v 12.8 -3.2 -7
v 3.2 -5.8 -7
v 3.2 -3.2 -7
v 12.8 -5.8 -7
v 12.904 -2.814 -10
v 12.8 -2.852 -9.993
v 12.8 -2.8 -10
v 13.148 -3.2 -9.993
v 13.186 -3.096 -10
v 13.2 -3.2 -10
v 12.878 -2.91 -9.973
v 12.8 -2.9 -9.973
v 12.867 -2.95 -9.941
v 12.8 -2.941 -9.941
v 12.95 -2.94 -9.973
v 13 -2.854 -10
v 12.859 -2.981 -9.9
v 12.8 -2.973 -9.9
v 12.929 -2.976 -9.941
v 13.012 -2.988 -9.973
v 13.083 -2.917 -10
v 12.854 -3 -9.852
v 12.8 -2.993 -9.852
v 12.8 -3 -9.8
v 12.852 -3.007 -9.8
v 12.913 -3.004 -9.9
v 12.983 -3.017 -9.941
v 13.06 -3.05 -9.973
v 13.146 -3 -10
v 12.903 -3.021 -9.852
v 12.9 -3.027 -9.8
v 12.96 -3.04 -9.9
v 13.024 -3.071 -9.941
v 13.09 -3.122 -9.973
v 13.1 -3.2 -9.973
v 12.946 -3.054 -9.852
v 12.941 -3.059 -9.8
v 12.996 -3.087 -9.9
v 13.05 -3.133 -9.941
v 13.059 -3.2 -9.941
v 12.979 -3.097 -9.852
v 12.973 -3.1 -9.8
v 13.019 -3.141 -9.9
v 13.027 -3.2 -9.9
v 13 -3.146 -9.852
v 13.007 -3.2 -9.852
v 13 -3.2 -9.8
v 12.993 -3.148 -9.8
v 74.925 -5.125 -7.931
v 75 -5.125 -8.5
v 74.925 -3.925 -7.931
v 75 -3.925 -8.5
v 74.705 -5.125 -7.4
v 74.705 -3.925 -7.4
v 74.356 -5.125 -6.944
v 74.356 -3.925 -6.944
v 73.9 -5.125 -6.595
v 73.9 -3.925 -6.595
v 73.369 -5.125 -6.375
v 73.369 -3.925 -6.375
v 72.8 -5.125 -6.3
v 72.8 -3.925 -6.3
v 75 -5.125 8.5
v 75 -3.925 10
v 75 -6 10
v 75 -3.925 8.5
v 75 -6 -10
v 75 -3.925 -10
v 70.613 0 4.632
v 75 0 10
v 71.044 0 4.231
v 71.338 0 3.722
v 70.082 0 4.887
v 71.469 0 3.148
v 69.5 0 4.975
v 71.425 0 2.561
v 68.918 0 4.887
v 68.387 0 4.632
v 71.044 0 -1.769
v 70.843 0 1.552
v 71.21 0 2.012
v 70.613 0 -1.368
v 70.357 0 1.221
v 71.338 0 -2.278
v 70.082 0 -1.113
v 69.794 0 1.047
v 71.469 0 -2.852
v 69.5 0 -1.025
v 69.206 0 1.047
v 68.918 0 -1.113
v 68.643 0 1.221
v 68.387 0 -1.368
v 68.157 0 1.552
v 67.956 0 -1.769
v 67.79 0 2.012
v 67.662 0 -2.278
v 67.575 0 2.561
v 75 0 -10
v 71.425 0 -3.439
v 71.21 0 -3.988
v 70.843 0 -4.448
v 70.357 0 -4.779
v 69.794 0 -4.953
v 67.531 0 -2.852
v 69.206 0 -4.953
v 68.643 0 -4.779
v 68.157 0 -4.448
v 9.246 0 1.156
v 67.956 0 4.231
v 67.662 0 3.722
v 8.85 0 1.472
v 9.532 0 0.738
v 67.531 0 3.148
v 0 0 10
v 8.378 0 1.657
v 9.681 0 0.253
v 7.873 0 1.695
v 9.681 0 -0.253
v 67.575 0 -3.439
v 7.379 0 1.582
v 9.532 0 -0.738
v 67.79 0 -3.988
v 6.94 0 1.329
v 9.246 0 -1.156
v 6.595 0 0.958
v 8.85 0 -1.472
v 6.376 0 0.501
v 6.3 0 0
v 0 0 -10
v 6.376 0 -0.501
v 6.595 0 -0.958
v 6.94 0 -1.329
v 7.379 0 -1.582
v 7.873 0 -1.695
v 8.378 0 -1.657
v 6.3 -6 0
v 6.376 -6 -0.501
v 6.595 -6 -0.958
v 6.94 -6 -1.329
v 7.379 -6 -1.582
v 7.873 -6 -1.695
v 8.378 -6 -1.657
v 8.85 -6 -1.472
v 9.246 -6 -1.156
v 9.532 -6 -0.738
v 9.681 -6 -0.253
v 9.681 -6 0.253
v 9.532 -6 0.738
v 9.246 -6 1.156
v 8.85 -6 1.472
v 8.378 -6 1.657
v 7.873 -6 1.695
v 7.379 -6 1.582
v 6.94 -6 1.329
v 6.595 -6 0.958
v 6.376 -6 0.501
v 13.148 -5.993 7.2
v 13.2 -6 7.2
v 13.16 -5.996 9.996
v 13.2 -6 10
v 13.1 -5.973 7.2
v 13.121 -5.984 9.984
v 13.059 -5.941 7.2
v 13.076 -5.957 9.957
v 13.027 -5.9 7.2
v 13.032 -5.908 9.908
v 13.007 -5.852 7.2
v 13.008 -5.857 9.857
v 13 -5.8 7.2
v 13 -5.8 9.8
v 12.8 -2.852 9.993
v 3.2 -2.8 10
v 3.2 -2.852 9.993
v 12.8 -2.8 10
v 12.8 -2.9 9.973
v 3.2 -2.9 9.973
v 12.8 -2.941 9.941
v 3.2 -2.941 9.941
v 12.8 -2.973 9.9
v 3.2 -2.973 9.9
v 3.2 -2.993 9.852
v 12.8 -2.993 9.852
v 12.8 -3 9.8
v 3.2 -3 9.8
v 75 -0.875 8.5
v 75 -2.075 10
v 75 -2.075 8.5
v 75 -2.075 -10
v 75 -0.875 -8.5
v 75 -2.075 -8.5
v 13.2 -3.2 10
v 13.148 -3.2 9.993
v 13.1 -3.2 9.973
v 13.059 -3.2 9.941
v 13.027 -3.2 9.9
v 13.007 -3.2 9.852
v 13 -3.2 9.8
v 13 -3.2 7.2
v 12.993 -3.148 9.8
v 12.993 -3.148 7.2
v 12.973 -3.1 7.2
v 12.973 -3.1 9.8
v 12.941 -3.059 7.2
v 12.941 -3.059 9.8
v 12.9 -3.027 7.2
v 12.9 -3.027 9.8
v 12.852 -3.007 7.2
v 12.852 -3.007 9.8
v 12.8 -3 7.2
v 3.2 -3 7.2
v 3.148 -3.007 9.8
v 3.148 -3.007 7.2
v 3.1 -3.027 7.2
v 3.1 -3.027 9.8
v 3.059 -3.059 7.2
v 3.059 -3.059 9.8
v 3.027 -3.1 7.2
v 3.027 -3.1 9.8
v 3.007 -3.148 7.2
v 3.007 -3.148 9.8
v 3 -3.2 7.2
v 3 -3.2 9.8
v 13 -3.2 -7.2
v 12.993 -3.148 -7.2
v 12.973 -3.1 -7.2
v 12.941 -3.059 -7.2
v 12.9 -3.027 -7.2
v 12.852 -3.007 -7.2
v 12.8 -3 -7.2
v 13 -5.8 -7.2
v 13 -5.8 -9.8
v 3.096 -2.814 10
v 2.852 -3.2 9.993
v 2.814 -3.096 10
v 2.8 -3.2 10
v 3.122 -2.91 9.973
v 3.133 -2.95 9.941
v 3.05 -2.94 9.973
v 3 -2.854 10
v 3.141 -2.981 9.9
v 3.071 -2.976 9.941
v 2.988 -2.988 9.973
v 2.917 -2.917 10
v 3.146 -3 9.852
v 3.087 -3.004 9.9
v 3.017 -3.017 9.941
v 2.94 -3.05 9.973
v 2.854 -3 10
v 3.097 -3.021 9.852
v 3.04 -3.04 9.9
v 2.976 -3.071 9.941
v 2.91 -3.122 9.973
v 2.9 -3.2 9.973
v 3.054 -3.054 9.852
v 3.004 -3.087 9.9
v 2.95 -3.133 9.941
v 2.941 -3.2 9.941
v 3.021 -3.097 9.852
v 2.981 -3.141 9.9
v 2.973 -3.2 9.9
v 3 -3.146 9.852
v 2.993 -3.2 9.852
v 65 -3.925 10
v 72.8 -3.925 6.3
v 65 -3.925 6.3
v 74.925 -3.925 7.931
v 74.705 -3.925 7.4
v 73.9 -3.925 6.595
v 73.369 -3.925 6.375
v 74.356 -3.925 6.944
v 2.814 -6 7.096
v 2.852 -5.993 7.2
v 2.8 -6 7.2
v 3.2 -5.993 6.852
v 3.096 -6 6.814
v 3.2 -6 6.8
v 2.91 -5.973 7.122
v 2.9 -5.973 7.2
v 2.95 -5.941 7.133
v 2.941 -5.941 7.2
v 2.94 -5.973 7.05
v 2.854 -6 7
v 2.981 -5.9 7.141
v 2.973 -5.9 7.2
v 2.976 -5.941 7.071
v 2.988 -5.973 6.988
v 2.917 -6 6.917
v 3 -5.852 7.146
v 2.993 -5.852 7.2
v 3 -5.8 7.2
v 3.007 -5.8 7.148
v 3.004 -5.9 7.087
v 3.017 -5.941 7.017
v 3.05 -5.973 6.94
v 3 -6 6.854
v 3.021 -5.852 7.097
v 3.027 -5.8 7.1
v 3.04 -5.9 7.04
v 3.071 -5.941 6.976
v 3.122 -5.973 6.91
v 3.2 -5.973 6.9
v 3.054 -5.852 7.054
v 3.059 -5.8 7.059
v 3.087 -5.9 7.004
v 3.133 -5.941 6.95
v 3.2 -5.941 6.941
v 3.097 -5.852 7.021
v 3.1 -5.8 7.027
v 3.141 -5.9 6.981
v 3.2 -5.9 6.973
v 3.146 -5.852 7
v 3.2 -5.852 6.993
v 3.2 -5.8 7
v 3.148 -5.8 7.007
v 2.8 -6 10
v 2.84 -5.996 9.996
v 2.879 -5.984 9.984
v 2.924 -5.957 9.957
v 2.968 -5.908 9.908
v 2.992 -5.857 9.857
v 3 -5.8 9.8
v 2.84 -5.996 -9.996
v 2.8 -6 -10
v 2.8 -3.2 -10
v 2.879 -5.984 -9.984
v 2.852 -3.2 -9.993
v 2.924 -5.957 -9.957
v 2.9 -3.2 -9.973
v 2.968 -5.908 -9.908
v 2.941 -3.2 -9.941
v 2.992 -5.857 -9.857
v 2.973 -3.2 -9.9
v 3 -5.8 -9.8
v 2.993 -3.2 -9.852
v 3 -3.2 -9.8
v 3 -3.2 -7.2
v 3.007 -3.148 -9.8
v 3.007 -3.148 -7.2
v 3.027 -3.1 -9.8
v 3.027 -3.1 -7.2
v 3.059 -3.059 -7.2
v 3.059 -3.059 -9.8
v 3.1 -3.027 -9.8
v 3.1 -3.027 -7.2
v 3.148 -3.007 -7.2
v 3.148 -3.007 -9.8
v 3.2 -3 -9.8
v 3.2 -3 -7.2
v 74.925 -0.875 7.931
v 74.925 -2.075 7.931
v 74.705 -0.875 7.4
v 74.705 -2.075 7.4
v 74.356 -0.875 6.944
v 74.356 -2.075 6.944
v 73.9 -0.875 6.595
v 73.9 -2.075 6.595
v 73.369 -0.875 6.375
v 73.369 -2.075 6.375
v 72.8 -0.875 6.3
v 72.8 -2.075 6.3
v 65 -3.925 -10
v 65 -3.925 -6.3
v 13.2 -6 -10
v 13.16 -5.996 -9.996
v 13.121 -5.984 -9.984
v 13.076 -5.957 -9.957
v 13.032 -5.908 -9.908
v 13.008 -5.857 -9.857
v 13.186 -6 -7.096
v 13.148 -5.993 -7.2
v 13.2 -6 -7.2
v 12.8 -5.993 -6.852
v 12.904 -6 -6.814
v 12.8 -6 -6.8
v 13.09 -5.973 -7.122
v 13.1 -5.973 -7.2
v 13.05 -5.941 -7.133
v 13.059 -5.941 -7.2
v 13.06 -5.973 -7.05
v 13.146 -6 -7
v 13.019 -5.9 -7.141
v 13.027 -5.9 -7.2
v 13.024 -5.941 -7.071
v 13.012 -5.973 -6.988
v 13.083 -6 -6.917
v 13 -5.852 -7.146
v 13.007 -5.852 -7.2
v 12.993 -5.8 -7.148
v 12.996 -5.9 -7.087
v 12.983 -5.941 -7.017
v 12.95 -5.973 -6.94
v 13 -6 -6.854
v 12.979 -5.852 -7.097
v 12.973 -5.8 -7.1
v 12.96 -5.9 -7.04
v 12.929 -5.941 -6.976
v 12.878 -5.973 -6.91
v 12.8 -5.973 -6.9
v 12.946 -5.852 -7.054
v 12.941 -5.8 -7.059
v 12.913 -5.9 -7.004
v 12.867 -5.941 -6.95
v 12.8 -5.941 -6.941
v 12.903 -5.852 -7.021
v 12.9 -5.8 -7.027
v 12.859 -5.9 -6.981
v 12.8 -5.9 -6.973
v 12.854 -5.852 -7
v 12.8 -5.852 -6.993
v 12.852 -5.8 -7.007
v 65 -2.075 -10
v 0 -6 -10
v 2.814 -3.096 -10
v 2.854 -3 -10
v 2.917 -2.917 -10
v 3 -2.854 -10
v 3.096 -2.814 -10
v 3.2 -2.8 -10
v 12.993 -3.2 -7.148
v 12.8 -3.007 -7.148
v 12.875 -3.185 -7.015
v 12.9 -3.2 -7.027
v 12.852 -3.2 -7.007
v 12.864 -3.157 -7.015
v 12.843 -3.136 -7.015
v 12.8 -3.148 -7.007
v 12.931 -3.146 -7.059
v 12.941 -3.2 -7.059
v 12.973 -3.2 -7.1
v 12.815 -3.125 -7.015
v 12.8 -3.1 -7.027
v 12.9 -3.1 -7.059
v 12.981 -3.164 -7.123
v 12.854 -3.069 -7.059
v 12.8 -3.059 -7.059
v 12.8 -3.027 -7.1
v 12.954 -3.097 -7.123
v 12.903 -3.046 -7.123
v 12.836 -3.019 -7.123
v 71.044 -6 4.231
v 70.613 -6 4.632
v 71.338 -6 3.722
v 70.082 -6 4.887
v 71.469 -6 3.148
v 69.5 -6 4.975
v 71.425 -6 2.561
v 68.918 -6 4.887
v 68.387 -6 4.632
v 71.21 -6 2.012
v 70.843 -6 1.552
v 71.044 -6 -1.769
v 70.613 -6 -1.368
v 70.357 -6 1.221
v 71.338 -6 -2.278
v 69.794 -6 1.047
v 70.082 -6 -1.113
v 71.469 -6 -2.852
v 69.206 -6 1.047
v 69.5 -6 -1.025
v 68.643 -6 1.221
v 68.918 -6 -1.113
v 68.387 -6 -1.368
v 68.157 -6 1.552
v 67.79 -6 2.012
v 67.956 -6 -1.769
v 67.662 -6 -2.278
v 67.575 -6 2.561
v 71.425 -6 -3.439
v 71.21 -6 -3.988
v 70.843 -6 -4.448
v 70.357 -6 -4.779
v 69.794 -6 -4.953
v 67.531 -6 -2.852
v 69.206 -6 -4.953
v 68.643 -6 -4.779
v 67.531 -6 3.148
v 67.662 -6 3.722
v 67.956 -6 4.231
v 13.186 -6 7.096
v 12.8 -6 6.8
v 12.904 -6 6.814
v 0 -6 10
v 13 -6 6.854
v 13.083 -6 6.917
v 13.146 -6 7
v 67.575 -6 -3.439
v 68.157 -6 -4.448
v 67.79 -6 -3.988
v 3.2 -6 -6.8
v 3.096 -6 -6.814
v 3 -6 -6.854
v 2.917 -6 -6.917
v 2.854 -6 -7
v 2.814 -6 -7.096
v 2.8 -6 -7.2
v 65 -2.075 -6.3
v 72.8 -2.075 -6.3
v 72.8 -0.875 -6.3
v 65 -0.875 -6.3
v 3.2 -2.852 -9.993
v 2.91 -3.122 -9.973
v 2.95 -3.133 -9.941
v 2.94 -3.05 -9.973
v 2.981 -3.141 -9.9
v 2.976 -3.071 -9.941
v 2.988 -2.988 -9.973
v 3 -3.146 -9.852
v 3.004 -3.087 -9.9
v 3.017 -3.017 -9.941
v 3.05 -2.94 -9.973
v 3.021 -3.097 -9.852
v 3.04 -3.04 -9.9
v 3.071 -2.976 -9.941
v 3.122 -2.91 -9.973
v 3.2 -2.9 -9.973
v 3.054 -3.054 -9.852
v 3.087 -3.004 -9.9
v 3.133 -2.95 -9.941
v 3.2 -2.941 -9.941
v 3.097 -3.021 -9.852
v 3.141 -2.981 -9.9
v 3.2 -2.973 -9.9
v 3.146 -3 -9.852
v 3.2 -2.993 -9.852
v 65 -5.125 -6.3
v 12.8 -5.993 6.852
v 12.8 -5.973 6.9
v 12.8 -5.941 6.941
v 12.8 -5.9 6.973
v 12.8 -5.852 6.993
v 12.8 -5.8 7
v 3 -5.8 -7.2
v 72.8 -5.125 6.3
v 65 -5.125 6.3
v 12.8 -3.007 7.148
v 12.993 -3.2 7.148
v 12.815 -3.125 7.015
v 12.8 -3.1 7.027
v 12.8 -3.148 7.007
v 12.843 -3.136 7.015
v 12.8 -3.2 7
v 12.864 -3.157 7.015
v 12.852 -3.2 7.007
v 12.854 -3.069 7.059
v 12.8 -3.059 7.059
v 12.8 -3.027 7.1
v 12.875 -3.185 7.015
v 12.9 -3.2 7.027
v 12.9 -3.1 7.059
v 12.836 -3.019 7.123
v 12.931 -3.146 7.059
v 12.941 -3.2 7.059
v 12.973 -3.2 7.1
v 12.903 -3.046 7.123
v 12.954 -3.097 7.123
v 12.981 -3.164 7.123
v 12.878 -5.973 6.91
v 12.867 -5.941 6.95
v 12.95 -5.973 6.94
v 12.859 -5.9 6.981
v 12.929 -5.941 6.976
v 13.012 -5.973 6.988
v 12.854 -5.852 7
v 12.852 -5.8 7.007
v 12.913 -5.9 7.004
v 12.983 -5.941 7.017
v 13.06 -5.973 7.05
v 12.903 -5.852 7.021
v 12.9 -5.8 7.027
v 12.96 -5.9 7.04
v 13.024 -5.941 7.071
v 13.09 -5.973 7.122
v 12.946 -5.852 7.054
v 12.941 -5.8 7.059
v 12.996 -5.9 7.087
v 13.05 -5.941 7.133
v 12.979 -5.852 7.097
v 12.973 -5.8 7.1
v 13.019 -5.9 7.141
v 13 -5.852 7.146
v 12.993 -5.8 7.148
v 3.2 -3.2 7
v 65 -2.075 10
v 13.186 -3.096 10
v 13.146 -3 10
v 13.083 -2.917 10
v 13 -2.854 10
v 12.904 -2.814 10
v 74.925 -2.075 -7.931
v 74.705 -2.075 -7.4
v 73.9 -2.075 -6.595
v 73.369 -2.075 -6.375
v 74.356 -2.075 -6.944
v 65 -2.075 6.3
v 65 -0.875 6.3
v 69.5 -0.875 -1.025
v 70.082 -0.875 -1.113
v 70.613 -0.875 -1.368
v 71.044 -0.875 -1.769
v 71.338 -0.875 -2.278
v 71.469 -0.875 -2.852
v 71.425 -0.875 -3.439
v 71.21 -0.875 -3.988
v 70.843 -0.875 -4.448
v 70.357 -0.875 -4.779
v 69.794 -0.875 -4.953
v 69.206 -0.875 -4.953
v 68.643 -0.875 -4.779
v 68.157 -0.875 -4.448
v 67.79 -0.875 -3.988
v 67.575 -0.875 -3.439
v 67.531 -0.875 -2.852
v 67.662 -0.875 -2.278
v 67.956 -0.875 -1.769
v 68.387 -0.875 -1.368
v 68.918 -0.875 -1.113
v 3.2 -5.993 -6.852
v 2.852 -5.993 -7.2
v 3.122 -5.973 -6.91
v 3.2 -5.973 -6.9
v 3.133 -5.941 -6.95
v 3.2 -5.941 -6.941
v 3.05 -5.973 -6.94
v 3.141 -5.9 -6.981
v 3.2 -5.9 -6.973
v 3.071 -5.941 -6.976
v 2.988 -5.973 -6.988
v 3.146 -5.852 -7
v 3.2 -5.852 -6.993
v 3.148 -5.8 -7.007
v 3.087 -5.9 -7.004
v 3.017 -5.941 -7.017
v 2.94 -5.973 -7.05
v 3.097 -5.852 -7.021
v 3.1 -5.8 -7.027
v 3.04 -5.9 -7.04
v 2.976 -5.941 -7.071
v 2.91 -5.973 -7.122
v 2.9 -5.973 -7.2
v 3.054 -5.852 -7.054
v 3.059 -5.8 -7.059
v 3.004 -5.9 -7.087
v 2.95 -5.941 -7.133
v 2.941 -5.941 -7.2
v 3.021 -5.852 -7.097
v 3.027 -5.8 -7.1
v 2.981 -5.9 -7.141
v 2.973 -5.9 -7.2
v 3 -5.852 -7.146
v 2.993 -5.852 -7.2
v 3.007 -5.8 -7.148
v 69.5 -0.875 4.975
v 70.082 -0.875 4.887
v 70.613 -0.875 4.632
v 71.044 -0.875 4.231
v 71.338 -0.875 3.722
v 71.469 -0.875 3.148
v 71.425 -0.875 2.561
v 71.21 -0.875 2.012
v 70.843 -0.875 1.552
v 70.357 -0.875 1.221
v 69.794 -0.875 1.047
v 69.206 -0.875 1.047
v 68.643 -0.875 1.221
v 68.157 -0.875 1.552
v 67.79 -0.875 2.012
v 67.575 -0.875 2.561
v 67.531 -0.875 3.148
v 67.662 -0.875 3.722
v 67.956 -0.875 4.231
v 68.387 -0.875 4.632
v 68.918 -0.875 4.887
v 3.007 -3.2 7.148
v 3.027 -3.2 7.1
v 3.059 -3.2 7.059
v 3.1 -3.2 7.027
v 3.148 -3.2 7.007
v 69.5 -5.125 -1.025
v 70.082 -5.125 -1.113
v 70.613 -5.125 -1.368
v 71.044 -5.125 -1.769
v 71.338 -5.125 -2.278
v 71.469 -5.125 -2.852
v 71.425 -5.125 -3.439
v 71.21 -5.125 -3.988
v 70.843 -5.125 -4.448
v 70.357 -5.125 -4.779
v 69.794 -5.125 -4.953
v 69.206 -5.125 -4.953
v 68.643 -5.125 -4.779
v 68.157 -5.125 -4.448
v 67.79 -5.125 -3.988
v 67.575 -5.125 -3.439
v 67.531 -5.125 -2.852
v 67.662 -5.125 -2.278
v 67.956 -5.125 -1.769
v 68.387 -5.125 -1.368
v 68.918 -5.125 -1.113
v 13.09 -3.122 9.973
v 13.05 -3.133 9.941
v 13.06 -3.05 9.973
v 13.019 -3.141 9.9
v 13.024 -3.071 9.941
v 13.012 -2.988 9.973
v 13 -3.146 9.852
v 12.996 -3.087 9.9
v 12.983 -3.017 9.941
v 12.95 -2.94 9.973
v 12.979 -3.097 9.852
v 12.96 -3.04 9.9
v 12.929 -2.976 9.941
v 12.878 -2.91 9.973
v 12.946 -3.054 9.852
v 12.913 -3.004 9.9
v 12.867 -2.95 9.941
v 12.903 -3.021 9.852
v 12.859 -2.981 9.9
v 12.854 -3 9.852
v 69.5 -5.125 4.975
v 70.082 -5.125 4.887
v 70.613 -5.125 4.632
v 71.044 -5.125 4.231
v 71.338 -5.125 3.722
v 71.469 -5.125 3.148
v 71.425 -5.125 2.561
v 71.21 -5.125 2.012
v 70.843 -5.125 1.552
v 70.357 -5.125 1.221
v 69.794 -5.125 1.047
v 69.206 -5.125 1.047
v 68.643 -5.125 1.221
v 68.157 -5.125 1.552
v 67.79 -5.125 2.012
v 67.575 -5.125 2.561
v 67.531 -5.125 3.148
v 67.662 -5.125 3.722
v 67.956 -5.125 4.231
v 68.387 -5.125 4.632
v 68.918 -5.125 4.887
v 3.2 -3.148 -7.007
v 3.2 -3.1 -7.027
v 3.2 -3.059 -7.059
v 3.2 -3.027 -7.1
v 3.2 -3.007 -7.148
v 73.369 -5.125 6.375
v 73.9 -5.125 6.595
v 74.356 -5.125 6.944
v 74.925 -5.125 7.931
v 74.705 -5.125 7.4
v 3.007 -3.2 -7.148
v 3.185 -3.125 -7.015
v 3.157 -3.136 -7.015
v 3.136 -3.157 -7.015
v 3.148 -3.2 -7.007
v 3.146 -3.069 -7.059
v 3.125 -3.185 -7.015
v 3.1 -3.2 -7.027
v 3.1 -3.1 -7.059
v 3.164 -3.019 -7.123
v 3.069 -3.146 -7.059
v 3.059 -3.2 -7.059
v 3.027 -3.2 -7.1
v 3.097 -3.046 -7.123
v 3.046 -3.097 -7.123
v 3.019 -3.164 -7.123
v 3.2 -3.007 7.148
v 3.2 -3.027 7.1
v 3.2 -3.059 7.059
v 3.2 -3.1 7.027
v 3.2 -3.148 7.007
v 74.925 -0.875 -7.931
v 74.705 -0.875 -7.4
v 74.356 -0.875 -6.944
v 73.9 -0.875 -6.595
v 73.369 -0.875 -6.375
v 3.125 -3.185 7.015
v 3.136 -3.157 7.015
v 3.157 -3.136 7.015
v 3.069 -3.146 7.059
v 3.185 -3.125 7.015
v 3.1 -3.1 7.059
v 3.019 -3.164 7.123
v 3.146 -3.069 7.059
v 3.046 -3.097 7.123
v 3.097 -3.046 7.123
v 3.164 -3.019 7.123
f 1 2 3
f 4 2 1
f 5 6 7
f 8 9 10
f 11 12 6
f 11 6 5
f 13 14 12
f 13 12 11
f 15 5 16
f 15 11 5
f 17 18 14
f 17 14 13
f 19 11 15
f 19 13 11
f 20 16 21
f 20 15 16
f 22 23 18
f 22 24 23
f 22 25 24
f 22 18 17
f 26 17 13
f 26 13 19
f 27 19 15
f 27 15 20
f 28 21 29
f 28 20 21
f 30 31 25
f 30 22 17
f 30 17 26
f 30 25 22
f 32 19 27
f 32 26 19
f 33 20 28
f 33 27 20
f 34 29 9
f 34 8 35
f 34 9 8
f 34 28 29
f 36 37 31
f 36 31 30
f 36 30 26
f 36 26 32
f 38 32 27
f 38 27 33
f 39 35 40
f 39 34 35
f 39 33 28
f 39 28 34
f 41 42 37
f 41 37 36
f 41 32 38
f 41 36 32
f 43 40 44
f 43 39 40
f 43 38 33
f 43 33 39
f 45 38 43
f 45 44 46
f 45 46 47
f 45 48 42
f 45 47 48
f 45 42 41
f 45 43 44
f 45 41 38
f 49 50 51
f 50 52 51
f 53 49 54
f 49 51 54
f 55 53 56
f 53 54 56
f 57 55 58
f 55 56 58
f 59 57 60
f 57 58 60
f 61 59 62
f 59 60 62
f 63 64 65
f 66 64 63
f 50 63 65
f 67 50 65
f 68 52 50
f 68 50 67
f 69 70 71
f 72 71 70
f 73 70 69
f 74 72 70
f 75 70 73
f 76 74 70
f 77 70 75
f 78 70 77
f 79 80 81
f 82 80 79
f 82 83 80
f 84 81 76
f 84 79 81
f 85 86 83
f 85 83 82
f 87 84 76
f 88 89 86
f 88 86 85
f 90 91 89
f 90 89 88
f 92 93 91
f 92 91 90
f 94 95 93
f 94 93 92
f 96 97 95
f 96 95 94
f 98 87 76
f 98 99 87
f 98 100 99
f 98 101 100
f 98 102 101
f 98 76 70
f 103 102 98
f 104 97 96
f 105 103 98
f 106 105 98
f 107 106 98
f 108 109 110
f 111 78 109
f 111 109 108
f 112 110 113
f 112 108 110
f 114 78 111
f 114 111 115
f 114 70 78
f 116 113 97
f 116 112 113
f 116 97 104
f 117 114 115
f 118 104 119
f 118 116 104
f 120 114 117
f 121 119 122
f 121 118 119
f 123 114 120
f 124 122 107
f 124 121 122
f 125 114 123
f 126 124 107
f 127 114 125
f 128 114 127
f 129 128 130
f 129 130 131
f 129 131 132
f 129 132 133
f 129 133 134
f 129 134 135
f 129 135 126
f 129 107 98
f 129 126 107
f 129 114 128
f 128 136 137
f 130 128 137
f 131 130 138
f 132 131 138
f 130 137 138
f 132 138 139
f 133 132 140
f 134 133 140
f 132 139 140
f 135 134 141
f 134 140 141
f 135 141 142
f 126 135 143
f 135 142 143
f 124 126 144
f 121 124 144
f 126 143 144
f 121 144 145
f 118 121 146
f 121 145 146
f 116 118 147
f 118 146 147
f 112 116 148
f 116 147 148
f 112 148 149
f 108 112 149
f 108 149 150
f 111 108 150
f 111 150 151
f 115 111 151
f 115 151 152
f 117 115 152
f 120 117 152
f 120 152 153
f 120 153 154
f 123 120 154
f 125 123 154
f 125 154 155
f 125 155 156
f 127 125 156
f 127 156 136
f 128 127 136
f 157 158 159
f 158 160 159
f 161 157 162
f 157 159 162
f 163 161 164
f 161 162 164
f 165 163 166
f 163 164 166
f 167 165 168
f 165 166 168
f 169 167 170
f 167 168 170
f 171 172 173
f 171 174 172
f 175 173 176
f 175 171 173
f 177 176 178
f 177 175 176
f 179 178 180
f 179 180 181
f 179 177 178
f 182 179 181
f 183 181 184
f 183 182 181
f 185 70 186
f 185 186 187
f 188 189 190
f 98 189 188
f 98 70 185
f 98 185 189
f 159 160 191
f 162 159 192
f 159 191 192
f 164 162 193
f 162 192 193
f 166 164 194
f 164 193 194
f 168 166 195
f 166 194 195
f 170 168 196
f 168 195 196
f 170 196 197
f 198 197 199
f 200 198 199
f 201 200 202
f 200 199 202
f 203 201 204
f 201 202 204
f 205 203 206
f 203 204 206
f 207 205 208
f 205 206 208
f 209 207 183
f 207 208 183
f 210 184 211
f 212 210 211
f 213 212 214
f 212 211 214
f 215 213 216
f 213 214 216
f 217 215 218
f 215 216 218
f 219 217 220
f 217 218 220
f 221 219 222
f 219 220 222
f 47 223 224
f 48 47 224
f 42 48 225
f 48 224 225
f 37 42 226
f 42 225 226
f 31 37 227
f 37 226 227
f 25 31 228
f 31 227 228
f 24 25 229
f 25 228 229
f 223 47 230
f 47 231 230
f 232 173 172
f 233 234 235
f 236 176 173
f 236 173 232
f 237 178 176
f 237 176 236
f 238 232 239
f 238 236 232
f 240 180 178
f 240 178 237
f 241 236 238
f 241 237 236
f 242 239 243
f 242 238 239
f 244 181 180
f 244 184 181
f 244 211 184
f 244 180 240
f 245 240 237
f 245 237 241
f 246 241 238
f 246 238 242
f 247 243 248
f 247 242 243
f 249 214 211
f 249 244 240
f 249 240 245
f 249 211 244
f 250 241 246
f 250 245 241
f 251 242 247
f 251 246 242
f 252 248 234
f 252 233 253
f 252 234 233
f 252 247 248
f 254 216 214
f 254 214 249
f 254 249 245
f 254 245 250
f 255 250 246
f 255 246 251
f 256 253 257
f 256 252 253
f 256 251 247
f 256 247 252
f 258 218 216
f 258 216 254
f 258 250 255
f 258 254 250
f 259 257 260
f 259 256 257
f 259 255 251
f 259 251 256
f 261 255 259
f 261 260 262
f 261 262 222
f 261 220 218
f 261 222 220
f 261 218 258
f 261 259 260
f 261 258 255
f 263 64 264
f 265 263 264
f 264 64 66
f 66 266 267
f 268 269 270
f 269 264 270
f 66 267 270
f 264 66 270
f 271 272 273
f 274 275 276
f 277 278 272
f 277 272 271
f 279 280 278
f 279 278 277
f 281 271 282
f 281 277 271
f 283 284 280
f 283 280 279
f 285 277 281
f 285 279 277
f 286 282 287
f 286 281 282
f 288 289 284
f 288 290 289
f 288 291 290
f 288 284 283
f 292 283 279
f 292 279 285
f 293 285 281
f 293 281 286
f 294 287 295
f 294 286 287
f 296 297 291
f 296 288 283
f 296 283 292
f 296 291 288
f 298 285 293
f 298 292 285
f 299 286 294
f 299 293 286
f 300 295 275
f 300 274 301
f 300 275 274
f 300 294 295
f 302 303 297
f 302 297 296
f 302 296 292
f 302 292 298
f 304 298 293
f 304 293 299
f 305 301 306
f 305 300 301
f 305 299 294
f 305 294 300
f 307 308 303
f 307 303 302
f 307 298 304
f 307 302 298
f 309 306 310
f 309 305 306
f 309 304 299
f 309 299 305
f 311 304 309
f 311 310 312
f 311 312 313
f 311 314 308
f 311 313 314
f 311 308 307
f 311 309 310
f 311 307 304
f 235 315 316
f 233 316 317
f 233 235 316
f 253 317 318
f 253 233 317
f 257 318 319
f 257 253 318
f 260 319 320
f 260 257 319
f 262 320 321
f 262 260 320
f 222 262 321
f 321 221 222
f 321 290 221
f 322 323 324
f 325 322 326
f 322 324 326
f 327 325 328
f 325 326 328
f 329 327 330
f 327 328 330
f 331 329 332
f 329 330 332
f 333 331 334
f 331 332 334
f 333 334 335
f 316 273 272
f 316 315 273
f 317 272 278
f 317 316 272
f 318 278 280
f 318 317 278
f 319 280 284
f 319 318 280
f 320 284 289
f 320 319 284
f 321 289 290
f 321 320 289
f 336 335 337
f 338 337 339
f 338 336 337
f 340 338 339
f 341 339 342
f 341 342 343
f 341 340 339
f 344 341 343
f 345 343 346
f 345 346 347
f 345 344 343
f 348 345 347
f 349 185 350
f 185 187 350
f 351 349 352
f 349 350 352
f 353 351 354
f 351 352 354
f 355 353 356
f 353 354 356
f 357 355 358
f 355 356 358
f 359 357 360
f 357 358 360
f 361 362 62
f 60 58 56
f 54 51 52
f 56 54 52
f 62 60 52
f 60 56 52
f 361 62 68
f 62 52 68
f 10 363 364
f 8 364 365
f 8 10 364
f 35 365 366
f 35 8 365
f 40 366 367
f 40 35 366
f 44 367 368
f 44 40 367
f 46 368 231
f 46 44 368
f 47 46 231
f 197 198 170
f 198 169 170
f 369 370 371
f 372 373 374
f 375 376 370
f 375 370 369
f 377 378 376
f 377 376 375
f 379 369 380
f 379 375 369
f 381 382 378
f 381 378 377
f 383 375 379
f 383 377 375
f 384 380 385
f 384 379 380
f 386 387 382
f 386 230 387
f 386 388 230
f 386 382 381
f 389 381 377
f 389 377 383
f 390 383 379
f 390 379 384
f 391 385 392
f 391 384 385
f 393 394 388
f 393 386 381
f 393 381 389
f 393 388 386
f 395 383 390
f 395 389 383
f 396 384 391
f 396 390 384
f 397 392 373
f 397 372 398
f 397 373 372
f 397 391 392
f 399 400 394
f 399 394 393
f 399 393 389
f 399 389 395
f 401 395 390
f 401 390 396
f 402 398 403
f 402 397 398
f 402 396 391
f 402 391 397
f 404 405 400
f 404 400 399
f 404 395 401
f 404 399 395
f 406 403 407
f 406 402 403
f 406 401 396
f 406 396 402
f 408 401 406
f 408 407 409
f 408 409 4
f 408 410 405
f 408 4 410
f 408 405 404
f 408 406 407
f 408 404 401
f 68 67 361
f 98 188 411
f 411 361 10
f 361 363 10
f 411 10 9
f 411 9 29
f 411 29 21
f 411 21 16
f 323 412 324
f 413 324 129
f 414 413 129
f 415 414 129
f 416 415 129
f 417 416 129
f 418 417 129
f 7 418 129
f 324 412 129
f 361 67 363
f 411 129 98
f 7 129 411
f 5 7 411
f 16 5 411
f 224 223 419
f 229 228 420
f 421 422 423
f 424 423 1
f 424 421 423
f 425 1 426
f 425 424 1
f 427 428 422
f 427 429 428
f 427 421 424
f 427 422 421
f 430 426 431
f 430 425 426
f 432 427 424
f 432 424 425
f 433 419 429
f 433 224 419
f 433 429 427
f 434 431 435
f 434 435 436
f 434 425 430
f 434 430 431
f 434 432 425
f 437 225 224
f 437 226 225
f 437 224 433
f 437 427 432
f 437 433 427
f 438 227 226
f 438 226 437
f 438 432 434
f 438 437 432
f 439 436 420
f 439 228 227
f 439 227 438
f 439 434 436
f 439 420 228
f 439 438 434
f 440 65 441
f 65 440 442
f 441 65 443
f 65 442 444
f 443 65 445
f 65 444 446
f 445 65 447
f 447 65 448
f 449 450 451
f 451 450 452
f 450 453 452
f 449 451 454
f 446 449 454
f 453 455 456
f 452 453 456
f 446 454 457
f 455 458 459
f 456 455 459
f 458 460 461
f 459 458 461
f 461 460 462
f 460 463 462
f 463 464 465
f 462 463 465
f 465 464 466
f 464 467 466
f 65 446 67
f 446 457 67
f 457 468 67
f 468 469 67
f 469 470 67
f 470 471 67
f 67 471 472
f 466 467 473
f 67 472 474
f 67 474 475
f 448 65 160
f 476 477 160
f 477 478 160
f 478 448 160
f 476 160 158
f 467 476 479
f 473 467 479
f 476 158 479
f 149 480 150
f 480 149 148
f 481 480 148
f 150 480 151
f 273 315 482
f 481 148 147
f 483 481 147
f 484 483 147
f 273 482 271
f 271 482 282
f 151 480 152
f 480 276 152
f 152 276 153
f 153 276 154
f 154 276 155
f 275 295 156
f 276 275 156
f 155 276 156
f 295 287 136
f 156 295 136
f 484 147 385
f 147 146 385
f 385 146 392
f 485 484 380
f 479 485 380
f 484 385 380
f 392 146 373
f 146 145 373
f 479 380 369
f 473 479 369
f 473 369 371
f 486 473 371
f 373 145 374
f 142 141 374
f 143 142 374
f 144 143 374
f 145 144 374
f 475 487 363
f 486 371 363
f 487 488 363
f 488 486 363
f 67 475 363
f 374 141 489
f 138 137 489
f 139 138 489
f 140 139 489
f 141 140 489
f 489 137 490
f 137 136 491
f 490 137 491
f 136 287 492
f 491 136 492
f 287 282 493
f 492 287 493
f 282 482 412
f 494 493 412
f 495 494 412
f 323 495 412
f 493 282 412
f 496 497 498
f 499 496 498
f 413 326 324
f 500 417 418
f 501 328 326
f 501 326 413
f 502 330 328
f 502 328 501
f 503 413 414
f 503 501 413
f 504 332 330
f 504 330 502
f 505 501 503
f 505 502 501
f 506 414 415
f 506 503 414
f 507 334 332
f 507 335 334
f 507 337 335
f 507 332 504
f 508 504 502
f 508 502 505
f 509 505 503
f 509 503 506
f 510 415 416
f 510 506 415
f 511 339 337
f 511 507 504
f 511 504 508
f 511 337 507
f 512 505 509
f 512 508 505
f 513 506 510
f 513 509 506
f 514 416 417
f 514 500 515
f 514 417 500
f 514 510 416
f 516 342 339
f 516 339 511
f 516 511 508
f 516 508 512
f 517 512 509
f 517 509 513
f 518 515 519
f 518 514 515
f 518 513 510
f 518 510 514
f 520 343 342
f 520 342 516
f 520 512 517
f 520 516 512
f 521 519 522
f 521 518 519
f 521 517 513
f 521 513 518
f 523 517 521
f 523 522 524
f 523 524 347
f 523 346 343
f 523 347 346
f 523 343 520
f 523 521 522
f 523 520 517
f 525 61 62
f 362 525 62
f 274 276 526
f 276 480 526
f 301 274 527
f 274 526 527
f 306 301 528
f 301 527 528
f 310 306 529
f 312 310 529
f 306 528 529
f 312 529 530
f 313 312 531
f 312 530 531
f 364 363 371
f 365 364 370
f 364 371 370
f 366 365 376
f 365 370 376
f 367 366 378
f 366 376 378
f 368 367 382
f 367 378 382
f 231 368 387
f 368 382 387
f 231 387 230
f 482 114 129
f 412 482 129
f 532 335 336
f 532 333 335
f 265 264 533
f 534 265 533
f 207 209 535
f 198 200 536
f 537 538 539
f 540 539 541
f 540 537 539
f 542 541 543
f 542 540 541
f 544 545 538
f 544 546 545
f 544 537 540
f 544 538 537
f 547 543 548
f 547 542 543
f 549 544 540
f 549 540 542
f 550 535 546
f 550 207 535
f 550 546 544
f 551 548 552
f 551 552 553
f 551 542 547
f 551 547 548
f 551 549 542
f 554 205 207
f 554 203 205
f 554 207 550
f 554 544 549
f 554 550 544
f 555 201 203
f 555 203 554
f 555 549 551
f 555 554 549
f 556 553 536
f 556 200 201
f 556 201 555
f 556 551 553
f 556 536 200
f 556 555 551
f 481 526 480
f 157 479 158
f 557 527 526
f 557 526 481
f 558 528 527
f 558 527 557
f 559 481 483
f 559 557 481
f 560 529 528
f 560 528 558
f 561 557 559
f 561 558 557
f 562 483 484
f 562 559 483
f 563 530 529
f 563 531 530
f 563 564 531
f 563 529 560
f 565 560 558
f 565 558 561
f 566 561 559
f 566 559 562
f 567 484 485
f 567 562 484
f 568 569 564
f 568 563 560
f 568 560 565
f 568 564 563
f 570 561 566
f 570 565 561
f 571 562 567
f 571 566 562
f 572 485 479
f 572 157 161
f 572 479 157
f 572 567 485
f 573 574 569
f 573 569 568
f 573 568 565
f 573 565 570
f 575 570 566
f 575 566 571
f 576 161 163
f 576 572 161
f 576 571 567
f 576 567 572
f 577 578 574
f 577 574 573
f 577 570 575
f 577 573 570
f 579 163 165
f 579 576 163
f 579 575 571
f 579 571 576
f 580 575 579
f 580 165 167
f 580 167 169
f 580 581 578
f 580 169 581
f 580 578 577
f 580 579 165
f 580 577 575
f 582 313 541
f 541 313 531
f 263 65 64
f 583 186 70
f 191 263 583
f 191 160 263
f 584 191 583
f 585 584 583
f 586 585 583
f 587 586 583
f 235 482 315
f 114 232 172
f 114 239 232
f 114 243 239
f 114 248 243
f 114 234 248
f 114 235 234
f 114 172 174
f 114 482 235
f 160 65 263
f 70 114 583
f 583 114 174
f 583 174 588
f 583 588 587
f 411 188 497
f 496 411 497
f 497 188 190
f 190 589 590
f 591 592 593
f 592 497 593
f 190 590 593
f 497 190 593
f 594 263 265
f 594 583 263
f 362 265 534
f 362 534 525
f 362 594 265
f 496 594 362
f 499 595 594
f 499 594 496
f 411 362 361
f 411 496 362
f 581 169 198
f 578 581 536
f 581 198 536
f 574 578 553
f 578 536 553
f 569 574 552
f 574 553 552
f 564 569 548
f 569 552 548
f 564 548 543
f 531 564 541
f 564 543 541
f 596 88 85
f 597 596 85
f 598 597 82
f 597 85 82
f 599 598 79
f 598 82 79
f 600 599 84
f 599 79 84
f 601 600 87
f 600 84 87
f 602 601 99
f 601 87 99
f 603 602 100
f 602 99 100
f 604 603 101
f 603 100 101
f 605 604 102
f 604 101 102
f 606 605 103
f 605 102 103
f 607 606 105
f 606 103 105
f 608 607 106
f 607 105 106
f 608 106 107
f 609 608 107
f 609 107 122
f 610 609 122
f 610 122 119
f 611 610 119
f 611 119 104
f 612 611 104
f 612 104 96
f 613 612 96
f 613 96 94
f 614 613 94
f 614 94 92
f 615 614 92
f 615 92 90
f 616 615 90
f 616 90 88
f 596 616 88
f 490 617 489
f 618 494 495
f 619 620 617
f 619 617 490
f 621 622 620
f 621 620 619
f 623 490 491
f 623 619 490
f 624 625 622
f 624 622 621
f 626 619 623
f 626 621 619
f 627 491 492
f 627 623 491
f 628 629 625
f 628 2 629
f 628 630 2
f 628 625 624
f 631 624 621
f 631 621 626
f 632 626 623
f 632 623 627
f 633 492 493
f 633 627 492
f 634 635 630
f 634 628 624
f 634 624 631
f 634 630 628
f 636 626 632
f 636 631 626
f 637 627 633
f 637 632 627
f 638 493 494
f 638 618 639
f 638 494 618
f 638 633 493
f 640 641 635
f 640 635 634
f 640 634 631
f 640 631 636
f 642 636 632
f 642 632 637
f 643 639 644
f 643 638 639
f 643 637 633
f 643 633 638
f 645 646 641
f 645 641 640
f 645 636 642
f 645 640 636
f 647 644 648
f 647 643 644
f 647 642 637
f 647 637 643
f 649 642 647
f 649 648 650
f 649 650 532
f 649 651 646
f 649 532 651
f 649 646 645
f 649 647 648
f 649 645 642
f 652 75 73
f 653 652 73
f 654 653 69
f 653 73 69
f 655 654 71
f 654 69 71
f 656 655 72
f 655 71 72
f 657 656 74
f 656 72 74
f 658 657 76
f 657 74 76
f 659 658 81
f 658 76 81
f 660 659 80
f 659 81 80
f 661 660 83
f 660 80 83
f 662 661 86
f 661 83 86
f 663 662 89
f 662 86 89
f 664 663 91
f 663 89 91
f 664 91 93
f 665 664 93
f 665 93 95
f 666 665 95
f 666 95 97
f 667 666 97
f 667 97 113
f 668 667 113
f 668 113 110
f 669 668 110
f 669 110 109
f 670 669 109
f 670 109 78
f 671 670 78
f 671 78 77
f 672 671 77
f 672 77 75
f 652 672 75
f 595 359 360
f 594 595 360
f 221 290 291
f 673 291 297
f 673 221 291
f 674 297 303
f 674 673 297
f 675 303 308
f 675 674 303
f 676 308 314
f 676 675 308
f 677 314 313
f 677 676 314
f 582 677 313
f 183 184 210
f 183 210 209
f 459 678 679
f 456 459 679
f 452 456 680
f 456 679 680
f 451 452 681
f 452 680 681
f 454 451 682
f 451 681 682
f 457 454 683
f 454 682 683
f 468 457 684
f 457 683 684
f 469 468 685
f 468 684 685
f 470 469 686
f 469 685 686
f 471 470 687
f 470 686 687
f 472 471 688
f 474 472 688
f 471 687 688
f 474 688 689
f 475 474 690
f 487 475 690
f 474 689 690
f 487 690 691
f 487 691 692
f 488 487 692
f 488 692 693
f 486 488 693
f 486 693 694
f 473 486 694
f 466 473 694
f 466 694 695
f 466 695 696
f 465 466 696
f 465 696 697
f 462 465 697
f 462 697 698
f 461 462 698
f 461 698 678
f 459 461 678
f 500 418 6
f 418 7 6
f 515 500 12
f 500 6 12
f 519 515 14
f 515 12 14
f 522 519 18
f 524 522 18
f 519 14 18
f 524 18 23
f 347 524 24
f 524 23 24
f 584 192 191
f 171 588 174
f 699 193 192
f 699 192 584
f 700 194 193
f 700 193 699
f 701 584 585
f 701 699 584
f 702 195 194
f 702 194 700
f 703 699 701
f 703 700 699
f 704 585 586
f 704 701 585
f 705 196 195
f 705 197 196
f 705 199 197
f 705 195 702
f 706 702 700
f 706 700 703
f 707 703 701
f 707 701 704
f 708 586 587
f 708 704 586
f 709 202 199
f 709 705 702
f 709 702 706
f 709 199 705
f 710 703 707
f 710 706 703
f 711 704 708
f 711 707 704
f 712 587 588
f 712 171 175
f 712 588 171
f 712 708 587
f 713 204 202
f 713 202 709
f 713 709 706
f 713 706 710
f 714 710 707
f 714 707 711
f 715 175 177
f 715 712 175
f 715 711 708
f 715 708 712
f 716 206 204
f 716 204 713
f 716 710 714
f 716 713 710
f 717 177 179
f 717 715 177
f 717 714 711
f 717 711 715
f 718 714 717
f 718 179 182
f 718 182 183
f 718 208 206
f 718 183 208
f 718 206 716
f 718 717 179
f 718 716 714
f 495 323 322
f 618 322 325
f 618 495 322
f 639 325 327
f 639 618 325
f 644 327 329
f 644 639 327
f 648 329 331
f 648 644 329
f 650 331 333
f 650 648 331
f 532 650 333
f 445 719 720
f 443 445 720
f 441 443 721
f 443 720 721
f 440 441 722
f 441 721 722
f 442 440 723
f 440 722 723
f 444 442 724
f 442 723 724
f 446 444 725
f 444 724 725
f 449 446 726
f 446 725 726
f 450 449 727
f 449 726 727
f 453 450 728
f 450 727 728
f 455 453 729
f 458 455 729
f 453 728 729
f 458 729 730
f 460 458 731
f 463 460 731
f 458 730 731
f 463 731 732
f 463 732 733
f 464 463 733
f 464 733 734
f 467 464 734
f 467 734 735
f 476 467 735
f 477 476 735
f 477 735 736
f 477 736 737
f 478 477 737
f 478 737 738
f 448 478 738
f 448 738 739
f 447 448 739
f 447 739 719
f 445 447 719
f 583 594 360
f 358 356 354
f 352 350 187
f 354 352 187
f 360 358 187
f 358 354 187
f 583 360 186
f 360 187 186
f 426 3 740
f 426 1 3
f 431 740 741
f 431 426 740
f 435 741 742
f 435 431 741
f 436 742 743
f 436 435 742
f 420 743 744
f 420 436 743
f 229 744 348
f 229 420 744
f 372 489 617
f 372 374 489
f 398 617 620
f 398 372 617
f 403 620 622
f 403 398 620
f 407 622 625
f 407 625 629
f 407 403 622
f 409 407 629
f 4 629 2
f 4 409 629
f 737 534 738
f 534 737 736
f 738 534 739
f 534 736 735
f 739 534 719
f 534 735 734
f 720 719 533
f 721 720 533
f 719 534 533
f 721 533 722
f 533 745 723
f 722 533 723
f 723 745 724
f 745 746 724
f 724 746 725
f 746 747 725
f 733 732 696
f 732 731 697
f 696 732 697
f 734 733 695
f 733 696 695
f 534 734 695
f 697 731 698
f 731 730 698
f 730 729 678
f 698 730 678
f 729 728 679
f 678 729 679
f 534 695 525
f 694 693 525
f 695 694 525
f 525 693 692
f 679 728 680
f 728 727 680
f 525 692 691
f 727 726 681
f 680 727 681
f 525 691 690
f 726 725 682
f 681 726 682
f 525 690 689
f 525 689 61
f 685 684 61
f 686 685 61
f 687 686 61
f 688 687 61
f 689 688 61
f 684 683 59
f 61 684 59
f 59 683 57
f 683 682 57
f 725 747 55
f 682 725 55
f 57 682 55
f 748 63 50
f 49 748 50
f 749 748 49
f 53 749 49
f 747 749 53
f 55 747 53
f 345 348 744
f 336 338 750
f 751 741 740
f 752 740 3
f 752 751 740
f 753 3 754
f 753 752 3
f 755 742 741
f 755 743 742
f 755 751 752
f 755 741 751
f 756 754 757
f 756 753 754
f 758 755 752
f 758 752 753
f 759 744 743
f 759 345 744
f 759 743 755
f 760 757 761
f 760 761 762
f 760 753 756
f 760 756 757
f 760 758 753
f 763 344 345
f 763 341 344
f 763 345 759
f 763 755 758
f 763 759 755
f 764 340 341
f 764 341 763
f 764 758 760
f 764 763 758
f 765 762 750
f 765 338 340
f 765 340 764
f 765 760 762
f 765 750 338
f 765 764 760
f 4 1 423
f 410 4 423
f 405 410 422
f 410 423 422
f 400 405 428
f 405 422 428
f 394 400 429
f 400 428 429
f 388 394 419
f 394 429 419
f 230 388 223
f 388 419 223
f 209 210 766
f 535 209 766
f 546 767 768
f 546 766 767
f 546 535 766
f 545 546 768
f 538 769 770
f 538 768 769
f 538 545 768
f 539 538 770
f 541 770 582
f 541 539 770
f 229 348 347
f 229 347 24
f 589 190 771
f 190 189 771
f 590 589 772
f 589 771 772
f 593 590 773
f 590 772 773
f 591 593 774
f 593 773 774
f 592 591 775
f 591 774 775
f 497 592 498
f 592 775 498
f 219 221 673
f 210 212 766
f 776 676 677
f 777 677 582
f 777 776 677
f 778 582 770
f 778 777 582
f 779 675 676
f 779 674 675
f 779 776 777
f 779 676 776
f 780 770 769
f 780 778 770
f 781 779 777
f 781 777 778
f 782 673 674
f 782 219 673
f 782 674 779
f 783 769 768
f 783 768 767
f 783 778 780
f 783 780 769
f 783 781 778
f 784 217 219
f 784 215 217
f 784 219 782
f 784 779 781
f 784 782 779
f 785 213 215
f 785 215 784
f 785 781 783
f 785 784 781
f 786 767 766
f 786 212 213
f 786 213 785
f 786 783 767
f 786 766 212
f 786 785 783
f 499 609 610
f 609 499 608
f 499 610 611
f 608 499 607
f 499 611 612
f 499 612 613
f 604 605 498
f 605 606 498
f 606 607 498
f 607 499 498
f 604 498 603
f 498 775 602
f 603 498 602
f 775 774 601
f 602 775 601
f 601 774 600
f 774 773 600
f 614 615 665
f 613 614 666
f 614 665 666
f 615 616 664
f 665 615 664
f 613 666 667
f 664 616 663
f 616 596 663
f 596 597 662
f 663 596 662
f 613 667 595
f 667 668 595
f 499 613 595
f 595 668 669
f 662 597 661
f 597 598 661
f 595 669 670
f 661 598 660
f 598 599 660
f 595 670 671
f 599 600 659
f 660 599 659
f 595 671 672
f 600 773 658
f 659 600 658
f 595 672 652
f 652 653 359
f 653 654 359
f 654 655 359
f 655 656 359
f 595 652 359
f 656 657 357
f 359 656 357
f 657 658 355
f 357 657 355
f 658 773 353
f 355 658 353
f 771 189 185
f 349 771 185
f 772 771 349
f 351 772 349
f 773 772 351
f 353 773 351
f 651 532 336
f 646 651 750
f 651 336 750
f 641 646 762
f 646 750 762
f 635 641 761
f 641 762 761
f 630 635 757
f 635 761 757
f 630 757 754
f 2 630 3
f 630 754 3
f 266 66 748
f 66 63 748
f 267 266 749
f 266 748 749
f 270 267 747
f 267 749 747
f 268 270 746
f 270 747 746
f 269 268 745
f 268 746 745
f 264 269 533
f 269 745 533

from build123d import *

# Parameters (mm, degrees)
SKETCH1_W            = 20
SKETCH1_H            = 6
BOSS_EXTRUDE1_DEPTH  = 75
M3_CLEARANCE_HOLE1_D = 3.4
SKETCH4_R            = 1.975
CUT_EXTRUDE1_DEPTH   = 76.901251637
CUT_EXTRUDE2_DEPTH   = 10
SKETCH6_W            = 10
SKETCH6_H            = 3
CUT_EXTRUDE3_DEPTH   = 3
FILLET1_R            = 0.2
FILLET2_R            = 2.2


with BuildPart() as part:
    # Sketch1 → Boss-Extrude1 (new body)
    with BuildSketch(Plane(origin=(0, 0, 0), x_dir=(0, 0, -1), z_dir=(1, 0, 0))):
        with Locations((0, -3)):
            Rectangle(SKETCH1_W, SKETCH1_H)
    extrude(amount=BOSS_EXTRUDE1_DEPTH)

    # M3 Clearance Hole1 (through all)
    with Locations(Plane(origin=(0, 0, 0), x_dir=(1, 0, 0), z_dir=(0, 1, 0))):
        with Locations((8, 0)):
            Hole(M3_CLEARANCE_HOLE1_D / 2)

    # Sketch4 → Cut-Extrude1 (cut, through all)
    with BuildSketch(Plane(origin=(0, 0, 0), x_dir=(1, 0, 0), z_dir=(0, 1, 0))):
        with Locations(Location((69.5, 3, 0), (0, 0, 270))):
            Circle(SKETCH4_R)
        with Locations(Location((69.5, -3, 0), (0, 0, 270))):
            Circle(SKETCH4_R)
    extrude(amount=-CUT_EXTRUDE1_DEPTH, mode=Mode.SUBTRACT)

    # Sketch5 → Cut-Extrude2 (cut)
    with BuildSketch(Plane(origin=(75, 0, 0), x_dir=(0, 0, -1), z_dir=(1, 0, 0))):
        Polygon((-10, -3.925), (-6.3, -3.925), (-6.3, -5.125), (6.3, -5.125), (6.3, -3.925), (10, -3.925), (10, -2.075), (6.3, -2.075), (6.3, -0.875), (-6.3, -0.875), (-6.3, -2.075), (-10, -2.075), align=None)
    extrude(amount=-CUT_EXTRUDE2_DEPTH, mode=Mode.SUBTRACT)

    # Sketch6 → Cut-Extrude3 (cut)
    with BuildSketch(Plane.XZ.offset(6)):
        with Locations((8, 8.5)):
            Rectangle(SKETCH6_W, SKETCH6_H)
        with Locations((8, -8.5)):
            Rectangle(SKETCH6_W, SKETCH6_H)
    extrude(amount=-CUT_EXTRUDE3_DEPTH, mode=Mode.SUBTRACT)

    # Fillet1
    fillet1_edges = [part.edges().sort_by_distance(p)[0] for p in [
        (3, -3, 8.5),
        (3, -4.5, 7),
        (8, -3, 10),
        (3, -4.5, 10),
        (13, -3, 8.5),
        (13, -4.5, 10),
        (8, -3, 7),
        (13, -4.5, 7),
        (3, -6, 8.5),
        (8, -6, 7),
        (13, -6, 8.5),
        (13, -3, -8.5),
        (13, -4.5, -7),
        (8, -3, -10),
        (13, -4.5, -10),
        (3, -3, -8.5),
        (3, -4.5, -10),
        (8, -3, -7),
        (3, -4.5, -7),
        (13, -6, -8.5),
        (8, -6, -7),
        (3, -6, -8.5),
    ]]
    fillet(fillet1_edges, radius=FILLET1_R)

    # Fillet2
    fillet2_edges = [part.edges().sort_by_distance(p)[0] for p in [
        (75, -1.475, -6.3),
        (75, -1.475, 6.3),
        (75, -4.525, 6.3),
        (75, -4.525, -6.3),
    ]]
    fillet(fillet2_edges, radius=FILLET2_R)


solid = part.part
